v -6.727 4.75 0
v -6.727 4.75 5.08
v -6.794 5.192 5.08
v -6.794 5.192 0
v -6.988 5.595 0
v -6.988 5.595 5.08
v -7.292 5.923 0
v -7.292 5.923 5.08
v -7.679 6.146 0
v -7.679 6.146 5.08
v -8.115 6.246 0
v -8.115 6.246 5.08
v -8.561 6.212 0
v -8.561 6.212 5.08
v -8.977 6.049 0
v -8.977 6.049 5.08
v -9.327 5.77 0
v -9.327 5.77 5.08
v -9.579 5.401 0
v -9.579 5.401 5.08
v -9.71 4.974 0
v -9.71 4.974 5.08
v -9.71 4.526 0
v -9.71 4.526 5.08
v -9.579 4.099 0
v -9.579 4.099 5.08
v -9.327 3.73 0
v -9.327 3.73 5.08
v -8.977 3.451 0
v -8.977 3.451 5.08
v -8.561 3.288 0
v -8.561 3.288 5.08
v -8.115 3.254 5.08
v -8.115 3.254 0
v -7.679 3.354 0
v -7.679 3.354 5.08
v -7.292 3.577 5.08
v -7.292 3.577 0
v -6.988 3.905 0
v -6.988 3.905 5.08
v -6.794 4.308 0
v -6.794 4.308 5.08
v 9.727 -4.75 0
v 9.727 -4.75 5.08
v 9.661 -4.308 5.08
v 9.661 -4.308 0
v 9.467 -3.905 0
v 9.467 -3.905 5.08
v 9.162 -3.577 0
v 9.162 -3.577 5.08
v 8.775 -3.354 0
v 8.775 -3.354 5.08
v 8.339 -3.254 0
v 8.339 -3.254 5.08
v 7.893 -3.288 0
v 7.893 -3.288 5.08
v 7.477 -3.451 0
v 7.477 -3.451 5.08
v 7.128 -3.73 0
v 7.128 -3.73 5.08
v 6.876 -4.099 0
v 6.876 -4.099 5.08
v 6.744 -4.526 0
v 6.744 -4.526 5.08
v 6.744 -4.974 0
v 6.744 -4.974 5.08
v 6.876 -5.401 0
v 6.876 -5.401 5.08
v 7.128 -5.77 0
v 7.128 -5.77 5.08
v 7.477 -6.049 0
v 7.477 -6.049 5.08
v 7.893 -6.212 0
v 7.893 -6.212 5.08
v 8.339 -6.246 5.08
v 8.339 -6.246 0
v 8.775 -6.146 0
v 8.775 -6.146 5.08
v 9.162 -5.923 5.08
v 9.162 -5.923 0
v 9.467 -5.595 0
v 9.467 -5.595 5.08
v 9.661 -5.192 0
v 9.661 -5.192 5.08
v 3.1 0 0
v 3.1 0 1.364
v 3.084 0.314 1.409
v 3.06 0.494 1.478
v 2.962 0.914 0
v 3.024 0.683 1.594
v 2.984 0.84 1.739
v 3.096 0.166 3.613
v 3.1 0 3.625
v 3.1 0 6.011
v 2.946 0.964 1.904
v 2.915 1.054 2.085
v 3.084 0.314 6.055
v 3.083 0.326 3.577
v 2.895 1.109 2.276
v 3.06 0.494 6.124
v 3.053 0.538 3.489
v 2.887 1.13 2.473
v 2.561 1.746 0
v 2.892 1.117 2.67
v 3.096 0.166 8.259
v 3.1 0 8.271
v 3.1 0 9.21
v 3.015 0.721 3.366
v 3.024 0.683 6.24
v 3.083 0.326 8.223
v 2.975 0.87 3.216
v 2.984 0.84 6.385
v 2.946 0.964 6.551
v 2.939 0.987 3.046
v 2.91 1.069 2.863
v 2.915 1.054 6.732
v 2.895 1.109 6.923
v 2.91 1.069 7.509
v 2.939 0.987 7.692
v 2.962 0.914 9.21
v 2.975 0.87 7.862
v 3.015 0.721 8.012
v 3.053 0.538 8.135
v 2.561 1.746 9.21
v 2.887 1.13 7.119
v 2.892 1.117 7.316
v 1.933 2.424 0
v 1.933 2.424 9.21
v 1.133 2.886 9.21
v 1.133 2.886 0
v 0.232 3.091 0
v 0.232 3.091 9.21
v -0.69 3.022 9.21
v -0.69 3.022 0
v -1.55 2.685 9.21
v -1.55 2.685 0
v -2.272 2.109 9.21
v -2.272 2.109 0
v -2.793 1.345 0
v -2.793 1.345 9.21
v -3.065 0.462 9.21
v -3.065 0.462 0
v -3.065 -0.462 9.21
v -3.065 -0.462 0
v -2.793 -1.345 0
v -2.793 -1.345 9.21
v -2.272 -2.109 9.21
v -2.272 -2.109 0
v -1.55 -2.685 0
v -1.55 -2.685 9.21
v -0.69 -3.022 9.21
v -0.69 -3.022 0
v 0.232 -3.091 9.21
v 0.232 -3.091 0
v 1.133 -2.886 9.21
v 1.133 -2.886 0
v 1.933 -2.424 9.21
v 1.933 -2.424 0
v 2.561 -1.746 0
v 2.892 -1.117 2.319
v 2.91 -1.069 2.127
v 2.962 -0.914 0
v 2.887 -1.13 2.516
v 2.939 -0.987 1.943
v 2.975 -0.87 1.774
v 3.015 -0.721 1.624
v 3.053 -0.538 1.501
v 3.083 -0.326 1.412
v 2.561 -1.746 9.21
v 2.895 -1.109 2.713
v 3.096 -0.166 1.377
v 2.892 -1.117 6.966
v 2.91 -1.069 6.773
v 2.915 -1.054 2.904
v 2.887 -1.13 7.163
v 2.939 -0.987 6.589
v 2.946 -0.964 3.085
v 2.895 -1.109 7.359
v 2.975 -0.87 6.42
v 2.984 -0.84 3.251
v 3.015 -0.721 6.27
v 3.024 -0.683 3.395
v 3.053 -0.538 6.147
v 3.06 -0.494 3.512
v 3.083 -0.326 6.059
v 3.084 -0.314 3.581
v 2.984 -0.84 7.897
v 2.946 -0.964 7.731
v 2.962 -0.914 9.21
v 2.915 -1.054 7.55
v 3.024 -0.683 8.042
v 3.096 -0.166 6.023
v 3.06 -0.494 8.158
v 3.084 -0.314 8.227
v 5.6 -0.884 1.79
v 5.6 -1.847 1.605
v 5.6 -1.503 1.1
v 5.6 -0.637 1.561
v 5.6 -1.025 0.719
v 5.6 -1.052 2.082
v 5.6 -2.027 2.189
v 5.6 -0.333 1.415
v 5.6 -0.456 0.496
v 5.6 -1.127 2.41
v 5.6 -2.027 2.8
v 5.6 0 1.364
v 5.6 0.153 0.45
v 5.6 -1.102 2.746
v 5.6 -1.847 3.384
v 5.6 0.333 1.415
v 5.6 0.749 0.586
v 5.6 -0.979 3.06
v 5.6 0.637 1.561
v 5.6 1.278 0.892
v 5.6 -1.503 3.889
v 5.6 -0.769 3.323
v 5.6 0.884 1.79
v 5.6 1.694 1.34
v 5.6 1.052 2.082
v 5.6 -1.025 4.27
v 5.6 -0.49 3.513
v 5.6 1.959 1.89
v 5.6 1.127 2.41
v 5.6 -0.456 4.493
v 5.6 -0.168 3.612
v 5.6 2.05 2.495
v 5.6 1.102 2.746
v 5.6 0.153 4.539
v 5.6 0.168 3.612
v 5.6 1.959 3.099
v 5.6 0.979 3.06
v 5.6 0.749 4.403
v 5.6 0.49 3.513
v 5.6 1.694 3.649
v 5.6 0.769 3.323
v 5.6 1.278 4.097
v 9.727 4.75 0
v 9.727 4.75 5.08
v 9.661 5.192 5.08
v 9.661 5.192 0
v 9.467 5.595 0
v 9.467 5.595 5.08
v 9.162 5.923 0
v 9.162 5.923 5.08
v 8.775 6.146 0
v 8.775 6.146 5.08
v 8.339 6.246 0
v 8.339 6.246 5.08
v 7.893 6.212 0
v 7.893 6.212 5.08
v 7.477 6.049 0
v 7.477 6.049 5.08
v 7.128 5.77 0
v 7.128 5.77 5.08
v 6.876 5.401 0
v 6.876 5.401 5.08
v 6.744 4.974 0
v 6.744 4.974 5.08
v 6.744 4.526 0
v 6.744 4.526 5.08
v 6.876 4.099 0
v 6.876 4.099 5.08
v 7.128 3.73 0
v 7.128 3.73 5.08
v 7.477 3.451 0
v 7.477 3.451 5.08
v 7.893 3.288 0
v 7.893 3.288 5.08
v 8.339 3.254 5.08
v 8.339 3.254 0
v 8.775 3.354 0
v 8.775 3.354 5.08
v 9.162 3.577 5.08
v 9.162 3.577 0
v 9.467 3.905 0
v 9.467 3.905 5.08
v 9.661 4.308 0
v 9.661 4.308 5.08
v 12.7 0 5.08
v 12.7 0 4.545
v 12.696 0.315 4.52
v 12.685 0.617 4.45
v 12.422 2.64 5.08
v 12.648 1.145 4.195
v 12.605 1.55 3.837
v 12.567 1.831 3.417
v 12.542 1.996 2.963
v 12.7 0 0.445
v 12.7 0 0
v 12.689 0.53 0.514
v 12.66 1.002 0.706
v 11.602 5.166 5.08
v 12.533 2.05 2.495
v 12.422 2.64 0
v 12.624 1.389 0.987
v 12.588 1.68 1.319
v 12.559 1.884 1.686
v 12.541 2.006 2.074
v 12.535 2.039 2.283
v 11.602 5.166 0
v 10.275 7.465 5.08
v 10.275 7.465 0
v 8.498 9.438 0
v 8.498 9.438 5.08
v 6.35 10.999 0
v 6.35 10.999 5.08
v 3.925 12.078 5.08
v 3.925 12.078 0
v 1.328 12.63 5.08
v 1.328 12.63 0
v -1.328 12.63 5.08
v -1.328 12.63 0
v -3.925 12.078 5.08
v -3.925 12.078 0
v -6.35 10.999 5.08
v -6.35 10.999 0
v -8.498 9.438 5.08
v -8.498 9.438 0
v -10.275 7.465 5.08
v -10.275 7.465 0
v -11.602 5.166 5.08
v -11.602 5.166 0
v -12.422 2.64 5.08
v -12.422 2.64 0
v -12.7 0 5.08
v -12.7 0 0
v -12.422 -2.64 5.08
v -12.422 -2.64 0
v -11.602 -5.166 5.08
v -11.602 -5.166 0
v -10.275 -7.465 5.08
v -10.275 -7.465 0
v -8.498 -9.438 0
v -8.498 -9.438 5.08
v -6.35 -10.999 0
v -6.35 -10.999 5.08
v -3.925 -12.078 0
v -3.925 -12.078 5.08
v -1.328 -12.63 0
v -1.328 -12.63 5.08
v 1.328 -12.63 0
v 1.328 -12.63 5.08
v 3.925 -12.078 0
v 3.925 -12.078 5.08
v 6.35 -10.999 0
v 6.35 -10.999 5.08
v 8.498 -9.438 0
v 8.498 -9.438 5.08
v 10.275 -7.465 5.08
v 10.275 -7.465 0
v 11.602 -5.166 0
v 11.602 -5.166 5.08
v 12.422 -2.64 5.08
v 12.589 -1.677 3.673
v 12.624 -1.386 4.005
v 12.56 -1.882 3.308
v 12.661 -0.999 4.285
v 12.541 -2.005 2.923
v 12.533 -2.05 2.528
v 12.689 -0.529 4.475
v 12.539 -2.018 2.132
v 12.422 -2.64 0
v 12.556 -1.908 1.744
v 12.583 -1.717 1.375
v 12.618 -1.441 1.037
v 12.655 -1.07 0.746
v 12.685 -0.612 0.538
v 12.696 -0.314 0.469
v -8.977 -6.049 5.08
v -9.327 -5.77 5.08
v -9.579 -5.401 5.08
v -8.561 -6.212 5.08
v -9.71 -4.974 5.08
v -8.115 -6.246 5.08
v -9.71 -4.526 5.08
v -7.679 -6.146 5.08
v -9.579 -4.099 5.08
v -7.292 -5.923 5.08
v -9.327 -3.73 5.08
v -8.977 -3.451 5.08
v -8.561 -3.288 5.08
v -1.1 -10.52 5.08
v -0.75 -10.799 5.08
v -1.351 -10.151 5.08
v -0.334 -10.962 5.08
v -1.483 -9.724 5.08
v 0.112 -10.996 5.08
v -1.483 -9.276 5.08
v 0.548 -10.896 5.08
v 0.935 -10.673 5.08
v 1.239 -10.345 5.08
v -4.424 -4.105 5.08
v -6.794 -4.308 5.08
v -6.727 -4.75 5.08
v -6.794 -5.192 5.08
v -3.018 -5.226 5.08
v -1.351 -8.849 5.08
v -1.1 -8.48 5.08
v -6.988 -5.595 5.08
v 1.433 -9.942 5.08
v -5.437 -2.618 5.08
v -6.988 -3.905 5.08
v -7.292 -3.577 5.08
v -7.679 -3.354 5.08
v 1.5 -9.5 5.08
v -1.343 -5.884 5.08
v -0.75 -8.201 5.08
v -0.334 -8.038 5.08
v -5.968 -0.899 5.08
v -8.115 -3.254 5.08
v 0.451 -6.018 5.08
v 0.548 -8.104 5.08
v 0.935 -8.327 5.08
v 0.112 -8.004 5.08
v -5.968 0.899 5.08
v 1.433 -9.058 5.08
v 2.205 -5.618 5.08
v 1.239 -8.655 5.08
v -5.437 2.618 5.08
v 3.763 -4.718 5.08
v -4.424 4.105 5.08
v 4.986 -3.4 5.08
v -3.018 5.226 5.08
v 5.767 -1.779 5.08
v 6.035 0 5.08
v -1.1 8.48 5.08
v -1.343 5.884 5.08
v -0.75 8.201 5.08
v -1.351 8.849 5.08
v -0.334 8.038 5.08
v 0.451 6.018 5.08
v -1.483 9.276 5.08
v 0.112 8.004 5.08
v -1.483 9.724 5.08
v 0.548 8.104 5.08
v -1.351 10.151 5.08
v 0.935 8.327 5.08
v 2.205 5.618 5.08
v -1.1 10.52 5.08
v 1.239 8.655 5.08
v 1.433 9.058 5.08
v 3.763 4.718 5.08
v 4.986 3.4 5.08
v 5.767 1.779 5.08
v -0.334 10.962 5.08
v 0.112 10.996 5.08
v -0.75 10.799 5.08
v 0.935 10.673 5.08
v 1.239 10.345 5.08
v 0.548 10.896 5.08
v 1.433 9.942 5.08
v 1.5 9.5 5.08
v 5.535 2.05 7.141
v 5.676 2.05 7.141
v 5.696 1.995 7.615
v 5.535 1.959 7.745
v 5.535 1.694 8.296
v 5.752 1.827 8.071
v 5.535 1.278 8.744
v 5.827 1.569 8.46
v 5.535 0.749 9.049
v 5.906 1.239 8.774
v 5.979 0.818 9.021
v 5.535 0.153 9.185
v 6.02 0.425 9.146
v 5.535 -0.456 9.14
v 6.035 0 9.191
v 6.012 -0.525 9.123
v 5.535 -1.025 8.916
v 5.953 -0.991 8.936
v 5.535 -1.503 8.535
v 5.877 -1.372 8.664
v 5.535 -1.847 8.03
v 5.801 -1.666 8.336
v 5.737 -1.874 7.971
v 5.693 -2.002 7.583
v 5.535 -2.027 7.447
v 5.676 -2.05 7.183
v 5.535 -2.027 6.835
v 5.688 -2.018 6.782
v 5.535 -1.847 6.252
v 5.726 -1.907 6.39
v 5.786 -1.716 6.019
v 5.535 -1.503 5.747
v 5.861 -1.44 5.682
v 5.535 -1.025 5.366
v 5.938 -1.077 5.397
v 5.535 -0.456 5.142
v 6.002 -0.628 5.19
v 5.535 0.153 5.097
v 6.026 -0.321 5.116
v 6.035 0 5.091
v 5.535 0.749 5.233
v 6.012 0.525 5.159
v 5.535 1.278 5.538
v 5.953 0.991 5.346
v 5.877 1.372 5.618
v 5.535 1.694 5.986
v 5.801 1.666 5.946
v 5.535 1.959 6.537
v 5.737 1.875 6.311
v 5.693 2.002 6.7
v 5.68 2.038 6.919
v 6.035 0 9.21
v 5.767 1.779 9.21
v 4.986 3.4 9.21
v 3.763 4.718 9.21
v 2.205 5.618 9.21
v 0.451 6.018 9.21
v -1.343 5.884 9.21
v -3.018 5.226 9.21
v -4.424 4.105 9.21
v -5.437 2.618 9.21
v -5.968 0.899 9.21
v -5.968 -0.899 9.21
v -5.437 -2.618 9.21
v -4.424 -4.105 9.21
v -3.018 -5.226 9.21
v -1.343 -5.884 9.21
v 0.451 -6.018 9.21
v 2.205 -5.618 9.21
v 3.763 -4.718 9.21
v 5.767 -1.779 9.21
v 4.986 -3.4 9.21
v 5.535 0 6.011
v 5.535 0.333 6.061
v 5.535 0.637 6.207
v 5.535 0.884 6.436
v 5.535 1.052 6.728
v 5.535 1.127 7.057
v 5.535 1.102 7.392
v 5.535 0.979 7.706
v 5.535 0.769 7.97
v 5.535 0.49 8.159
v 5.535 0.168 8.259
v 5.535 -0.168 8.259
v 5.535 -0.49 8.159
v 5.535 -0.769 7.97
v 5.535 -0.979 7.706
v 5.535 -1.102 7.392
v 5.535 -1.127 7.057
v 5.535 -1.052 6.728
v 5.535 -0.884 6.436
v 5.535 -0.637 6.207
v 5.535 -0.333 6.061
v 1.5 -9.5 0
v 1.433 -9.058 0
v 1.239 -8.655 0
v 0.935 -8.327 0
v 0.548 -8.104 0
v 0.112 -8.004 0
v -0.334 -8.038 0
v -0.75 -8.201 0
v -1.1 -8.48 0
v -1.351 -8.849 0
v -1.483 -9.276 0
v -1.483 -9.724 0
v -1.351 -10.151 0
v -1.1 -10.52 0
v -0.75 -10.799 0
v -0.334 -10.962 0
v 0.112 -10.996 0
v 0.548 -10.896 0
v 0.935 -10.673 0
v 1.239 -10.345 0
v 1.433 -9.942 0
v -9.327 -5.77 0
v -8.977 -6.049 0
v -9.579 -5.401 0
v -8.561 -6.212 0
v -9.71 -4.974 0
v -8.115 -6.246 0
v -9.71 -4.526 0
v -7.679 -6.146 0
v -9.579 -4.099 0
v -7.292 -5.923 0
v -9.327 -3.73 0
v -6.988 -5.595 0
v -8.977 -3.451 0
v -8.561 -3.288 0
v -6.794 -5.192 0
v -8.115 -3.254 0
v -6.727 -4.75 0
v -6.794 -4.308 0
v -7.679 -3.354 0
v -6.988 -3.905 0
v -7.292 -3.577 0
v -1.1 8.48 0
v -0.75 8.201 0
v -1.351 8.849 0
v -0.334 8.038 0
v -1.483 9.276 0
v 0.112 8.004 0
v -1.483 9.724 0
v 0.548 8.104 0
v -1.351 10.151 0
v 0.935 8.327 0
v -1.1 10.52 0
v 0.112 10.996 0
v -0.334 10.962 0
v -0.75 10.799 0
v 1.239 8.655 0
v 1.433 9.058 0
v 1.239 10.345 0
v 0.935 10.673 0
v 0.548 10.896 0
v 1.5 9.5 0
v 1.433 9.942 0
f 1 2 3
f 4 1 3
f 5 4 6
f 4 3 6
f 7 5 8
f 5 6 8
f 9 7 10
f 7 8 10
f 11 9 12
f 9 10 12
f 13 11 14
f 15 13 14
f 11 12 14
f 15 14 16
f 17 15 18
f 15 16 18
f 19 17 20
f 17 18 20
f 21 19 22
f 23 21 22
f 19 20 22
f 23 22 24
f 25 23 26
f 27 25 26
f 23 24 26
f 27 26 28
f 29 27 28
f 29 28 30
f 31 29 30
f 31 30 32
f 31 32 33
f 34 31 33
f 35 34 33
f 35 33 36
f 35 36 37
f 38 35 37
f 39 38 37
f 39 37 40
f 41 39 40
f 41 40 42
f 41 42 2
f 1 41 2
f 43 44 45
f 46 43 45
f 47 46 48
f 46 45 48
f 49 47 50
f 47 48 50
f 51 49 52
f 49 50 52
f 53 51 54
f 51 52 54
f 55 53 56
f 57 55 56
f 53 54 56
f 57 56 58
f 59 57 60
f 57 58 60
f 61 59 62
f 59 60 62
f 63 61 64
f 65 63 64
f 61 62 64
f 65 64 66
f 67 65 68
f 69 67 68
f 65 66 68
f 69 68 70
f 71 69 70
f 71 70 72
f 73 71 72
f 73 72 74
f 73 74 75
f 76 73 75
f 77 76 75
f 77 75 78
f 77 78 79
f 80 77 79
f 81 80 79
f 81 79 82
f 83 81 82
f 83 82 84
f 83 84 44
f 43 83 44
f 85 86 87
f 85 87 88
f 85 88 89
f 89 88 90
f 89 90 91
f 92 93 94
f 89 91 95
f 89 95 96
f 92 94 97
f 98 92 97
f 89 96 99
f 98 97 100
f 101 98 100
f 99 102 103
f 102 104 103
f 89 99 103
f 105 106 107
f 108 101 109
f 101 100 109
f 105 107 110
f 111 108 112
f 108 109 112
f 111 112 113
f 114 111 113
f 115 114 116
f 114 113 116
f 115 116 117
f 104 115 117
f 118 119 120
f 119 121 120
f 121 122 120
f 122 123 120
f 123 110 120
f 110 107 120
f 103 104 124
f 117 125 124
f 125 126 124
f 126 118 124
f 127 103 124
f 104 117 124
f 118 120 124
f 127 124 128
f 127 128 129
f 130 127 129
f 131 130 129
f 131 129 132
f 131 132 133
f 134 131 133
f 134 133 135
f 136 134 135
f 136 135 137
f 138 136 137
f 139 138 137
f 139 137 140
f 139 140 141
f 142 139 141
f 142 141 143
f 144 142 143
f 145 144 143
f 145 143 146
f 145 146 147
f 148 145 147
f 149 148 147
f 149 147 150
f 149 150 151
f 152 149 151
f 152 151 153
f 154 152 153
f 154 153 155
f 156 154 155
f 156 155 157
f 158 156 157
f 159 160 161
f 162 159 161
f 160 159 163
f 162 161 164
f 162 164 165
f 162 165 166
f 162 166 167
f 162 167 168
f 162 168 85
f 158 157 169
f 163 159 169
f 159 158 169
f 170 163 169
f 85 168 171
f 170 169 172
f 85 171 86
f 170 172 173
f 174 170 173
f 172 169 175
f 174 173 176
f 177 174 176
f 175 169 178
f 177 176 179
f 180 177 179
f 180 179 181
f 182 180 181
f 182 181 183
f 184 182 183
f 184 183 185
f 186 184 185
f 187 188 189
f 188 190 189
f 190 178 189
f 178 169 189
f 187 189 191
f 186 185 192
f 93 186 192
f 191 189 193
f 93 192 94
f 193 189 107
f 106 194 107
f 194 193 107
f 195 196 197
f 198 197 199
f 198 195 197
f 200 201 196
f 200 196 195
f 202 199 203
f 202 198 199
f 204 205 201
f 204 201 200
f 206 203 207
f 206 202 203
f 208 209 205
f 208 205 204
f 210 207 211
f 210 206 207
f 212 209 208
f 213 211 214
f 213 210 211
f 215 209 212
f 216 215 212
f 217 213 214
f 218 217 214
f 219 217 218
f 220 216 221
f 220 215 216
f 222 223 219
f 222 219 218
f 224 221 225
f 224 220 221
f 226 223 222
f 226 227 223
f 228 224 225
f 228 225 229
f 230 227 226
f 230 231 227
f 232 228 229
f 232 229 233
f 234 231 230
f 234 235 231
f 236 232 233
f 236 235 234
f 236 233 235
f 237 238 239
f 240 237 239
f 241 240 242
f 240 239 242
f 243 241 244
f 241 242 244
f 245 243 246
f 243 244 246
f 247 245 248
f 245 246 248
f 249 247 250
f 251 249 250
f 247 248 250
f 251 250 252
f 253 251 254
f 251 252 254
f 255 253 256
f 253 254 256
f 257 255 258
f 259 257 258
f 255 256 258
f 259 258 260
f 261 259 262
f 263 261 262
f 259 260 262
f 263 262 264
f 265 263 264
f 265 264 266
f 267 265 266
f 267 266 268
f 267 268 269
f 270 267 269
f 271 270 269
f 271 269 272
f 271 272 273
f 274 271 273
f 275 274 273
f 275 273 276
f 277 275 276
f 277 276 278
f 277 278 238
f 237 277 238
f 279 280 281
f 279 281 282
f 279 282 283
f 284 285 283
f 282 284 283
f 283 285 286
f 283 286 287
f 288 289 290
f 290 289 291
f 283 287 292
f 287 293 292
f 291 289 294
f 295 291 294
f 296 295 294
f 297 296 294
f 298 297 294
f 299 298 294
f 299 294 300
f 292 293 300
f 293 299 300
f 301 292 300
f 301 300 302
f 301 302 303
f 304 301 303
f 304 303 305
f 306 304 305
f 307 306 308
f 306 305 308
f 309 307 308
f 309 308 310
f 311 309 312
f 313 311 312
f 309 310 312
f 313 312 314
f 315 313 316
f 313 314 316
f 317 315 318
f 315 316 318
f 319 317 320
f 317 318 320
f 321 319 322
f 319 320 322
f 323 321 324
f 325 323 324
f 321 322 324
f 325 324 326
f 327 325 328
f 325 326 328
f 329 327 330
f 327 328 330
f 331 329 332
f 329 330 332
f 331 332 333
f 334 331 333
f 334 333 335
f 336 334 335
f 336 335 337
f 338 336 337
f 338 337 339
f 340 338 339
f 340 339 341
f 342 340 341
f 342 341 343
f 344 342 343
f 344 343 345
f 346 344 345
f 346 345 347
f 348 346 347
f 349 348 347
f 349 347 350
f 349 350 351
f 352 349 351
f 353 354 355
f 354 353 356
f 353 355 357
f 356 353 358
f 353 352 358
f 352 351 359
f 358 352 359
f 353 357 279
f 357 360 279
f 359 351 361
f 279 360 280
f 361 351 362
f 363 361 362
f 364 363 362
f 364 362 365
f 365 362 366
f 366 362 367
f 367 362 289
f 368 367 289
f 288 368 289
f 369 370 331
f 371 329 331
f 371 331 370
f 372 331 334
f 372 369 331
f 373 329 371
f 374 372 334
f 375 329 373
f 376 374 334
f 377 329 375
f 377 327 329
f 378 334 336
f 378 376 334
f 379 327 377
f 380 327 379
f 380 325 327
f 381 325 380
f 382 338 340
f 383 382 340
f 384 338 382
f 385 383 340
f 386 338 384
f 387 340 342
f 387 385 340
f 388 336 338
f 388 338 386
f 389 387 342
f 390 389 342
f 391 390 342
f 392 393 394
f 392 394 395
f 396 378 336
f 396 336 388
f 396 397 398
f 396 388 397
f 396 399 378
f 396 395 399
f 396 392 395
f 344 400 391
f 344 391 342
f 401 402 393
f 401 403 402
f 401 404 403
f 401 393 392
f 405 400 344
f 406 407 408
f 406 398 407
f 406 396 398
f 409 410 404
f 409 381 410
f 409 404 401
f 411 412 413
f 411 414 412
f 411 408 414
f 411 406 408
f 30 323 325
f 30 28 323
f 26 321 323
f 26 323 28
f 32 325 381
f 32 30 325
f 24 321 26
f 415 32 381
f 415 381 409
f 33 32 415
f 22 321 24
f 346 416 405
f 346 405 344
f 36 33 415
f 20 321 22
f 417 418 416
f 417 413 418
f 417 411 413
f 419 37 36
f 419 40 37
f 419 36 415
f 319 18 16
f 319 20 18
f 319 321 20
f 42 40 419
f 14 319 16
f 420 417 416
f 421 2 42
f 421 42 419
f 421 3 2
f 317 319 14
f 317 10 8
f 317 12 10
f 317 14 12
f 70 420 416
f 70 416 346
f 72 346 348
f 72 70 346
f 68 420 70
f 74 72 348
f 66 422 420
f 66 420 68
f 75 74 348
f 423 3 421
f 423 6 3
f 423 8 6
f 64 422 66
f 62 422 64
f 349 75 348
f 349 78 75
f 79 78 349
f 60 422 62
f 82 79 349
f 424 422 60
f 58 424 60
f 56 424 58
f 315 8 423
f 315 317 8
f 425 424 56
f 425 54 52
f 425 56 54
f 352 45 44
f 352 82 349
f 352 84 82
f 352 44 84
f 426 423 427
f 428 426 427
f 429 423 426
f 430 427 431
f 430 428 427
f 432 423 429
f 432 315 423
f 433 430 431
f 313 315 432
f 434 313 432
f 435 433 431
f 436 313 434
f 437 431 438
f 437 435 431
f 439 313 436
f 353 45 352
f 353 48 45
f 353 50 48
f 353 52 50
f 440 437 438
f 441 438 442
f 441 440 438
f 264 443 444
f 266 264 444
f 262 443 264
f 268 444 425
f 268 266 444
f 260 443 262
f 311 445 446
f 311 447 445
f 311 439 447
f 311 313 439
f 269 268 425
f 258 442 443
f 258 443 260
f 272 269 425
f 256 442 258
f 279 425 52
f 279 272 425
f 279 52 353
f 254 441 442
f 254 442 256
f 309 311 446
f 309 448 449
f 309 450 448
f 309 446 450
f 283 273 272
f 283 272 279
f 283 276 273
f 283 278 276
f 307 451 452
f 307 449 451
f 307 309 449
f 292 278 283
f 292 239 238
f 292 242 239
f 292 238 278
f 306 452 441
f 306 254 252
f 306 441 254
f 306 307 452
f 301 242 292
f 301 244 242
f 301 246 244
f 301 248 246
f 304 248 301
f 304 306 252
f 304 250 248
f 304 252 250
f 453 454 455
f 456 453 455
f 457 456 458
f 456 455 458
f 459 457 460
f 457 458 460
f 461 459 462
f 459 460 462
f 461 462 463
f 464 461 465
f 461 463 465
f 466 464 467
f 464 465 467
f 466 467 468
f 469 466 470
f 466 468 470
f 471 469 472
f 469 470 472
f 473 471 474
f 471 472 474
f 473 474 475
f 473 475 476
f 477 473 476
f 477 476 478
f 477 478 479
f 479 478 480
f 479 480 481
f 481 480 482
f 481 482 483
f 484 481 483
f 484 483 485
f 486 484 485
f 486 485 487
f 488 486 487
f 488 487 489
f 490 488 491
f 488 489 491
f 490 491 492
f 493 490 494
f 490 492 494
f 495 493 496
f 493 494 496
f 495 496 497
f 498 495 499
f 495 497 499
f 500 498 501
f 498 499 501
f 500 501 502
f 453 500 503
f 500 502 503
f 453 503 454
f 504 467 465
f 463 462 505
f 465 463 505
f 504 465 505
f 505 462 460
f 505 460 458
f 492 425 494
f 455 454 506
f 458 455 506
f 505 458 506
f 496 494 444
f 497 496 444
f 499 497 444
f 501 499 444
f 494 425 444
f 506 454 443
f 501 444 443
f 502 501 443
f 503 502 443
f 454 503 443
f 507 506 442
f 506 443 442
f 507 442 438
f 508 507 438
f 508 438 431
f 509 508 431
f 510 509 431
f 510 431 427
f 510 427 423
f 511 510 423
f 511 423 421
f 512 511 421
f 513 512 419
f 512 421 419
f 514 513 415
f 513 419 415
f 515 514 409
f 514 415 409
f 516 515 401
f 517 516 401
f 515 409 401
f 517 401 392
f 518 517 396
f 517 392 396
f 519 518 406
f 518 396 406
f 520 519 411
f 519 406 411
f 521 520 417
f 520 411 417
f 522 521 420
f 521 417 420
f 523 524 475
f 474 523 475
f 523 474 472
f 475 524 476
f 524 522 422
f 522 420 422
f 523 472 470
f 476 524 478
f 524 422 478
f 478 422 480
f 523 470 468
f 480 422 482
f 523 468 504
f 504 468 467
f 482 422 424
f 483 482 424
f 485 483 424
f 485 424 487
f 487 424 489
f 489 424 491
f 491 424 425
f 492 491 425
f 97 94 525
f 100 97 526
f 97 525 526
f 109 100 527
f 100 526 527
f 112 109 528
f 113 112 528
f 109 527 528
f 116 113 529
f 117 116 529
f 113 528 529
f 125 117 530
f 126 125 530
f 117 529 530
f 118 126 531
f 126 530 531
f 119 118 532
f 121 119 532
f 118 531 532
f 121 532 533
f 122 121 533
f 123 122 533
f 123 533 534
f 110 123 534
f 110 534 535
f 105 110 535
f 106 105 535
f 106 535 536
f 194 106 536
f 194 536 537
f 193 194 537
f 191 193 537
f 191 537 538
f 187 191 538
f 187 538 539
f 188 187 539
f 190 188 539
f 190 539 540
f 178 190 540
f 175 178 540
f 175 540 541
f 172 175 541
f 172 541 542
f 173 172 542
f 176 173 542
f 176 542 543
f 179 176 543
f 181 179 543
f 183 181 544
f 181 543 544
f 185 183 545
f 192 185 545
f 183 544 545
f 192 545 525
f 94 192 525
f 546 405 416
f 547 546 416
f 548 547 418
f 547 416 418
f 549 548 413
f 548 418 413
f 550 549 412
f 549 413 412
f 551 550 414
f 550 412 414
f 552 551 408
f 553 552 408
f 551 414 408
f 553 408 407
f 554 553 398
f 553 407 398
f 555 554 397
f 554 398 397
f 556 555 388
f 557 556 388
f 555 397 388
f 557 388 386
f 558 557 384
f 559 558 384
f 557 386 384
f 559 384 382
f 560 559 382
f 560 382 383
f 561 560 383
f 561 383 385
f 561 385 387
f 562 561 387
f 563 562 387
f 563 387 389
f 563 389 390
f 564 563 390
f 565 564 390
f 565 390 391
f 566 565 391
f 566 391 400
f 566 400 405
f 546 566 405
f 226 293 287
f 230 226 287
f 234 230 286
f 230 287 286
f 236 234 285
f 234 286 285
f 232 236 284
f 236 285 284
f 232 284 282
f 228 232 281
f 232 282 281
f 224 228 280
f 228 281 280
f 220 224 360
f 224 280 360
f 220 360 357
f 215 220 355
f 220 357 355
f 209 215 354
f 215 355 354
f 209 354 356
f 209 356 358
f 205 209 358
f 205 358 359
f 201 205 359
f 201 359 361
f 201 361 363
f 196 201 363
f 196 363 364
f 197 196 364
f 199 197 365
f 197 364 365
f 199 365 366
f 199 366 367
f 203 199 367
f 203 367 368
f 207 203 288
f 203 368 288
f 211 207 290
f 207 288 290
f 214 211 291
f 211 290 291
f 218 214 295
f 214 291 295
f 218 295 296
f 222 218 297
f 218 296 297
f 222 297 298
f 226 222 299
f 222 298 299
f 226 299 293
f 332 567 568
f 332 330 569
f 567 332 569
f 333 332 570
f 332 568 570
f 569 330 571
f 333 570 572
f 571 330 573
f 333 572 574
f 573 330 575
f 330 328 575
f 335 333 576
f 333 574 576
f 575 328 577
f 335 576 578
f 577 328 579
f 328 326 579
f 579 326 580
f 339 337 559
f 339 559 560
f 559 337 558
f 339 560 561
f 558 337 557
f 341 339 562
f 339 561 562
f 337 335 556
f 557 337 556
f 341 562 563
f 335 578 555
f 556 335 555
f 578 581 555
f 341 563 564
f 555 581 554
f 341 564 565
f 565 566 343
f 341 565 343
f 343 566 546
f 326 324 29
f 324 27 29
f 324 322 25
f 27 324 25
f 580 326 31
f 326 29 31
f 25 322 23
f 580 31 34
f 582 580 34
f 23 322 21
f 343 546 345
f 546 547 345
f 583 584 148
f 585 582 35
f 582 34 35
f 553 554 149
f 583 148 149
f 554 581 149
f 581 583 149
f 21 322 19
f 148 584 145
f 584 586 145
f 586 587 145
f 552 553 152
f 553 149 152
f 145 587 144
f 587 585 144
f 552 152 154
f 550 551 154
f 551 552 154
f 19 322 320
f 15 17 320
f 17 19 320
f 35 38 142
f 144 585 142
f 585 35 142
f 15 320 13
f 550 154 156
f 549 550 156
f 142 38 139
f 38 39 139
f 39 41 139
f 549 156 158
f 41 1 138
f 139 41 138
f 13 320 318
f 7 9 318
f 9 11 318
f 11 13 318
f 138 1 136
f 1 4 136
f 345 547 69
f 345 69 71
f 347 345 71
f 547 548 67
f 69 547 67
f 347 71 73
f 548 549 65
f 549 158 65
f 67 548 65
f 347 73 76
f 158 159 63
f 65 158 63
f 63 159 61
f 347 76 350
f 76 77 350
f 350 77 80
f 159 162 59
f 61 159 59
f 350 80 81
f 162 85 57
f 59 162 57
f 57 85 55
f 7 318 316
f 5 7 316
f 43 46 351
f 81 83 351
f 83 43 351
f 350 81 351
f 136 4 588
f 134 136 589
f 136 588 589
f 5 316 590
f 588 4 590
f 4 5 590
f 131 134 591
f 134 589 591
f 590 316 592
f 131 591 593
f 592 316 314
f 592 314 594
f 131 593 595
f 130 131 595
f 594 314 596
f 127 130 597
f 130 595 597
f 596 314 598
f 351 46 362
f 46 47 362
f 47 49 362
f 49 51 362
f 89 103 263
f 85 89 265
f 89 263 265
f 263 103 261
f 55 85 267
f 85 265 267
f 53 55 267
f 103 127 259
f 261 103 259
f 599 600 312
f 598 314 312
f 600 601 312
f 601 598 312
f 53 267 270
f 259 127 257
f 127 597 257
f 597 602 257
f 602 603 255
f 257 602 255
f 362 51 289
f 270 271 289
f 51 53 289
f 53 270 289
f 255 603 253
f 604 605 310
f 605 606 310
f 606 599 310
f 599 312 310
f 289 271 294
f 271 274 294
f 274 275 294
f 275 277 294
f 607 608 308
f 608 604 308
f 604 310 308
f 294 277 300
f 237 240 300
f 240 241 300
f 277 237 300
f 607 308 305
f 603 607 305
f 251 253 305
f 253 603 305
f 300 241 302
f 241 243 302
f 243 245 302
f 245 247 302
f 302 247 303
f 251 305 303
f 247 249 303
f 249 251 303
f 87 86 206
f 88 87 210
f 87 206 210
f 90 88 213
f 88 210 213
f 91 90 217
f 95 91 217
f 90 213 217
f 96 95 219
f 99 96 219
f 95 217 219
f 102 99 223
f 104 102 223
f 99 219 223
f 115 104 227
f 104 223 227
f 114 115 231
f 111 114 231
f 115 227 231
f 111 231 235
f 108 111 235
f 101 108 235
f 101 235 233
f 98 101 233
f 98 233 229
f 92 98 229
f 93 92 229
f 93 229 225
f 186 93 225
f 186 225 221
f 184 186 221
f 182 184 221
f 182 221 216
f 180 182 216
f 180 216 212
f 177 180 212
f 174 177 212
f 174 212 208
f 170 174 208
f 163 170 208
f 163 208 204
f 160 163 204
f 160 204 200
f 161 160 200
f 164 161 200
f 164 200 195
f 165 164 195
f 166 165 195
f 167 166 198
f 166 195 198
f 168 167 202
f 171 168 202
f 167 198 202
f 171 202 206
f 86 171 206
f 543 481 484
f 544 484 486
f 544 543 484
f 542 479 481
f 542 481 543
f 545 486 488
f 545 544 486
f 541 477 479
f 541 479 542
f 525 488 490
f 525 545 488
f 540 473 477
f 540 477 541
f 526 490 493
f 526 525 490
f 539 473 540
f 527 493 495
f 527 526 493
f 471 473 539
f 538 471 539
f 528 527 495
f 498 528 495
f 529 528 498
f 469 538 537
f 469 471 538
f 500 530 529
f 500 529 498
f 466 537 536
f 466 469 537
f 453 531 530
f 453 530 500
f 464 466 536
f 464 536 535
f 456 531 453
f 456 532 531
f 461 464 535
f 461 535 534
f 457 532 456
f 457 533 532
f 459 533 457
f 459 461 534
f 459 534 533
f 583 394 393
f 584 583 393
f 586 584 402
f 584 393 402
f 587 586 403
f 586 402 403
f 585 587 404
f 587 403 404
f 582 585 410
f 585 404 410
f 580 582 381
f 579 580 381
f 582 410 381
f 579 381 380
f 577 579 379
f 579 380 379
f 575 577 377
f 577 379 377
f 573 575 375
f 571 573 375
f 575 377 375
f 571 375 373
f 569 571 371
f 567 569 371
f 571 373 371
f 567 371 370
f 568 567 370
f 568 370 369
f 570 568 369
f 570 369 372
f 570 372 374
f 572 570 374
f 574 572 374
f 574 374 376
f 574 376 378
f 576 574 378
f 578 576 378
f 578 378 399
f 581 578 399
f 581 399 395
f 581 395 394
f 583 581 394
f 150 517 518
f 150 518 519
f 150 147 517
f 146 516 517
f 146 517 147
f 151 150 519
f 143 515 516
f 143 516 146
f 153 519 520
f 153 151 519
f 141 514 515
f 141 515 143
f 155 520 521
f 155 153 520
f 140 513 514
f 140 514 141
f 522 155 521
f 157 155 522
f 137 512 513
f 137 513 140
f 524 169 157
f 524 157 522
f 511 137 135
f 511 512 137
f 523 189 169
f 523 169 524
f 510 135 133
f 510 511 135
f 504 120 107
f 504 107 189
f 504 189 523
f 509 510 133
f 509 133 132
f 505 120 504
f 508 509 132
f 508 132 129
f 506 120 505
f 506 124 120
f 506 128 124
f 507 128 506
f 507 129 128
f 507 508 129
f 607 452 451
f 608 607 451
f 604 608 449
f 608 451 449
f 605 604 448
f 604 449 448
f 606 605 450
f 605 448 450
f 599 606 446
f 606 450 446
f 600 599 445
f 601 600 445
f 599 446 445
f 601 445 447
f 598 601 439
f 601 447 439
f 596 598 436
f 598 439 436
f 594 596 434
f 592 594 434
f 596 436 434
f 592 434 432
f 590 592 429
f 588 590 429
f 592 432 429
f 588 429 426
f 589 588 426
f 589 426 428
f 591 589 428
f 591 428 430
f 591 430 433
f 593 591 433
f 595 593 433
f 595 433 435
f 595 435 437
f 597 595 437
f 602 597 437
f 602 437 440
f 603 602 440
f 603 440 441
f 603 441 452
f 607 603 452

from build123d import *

# Parameters (mm, degrees)
SKETCH1_R                  = 12.7
BOSS_EXTRUDE1_DEPTH        = 5.08
SKETCH2_R                  = 6.035
BOSS_EXTRUDE2_DEPTH        = 4.13
CUT_EXTRUDE1_REACH         = 22.184
SKETCH3_R                  = 3.1
SKETCH16_R                 = 2.05
CUT_EXTRUDE2_DEPTH         = 0.5
F_4_40_TAPPED_HOLE3_REACH  = 26.055
F_4_40_TAPPED_HOLE3_BORE_R = 1.1303
SKETCH24_R                 = 2.05
CUT_EXTRUDE3_DEPTH         = 7.1
F_4_40_TAPPED_HOLE4_REACH  = 26.104
F_4_40_TAPPED_HOLE4_BORE_R = 1.1303
SKETCH29_R                 = 1.5
CUT_EXTRUDE4_DEPTH         = 10


with BuildPart() as part:
    # Sketch1 → Boss-Extrude1 (new body)
    with BuildSketch(Plane.XY):
        Circle(SKETCH1_R)
    extrude(amount=BOSS_EXTRUDE1_DEPTH)

    # Sketch2 → Boss-Extrude2 (add)
    with BuildSketch(Plane.XY.offset(5.08)):
        Circle(SKETCH2_R)
    extrude(amount=BOSS_EXTRUDE2_DEPTH)

    # Sketch3 → Cut-Extrude1 (cut, up to next)
    with BuildSketch(Plane.XY.offset(9.21), mode=Mode.PRIVATE) as cut_extrude1_sk1:
        Circle(SKETCH3_R)
    cut_extrude1_tool1 = extrude(cut_extrude1_sk1.sketch, amount=-CUT_EXTRUDE1_REACH, mode=Mode.PRIVATE) & part.part
    add(cut_extrude1_tool1.solids().sort_by_distance((0, 0, 9.21))[0], mode=Mode.SUBTRACT)

    # Sketch16 → Cut-Extrude2 (cut)
    with BuildSketch(Plane(origin=(6.035, 0, 9.21), x_dir=(0, 0, -1), z_dir=(1, 0, 0))):
        with Locations(Location((2.069027283, 0, 0), (0, 0, 90))):
            Circle(SKETCH16_R)
    extrude(amount=-CUT_EXTRUDE2_DEPTH, mode=Mode.SUBTRACT)

    # #4-40 Tapped Hole3 bore → #4-40 Tapped Hole3 (cut, up to next)
    with BuildSketch(Plane(origin=(5.535, 0, 0), x_dir=(0, 0, -1), z_dir=(1, 0, 0)), mode=Mode.PRIVATE) as f_4_40_tapped_hole3_sk1:
        with Locations((-7.140972717, 0)):
            Circle(F_4_40_TAPPED_HOLE3_BORE_R)
    f_4_40_tapped_hole3_tool1 = extrude(f_4_40_tapped_hole3_sk1.sketch, amount=-F_4_40_TAPPED_HOLE3_REACH, mode=Mode.PRIVATE) & part.part
    add(f_4_40_tapped_hole3_tool1.solids().sort_by_distance((5.535, 0, 7.140973))[0], mode=Mode.SUBTRACT)

    # Sketch24 → Cut-Extrude3 (cut)
    with BuildSketch(Plane(origin=(12.7, 0, 5.08), x_dir=(0, 0, -1), z_dir=(1, 0, 0))):
        with Locations(Location((2.585319139, 0, 0), (0, 0, 90))):
            Circle(SKETCH24_R)
    extrude(amount=-CUT_EXTRUDE3_DEPTH, mode=Mode.SUBTRACT)

    # #4-40 Tapped Hole4 bore → #4-40 Tapped Hole4 (cut, up to next)
    with BuildSketch(Plane(origin=(5.6, 0, 0), x_dir=(0, 0, -1), z_dir=(1, 0, 0)), mode=Mode.PRIVATE) as f_4_40_tapped_hole4_sk1:
        with Locations((-2.494680861, 0)):
            Circle(F_4_40_TAPPED_HOLE4_BORE_R)
    f_4_40_tapped_hole4_tool1 = extrude(f_4_40_tapped_hole4_sk1.sketch, amount=-F_4_40_TAPPED_HOLE4_REACH, mode=Mode.PRIVATE) & part.part
    add(f_4_40_tapped_hole4_tool1.solids().sort_by_distance((5.6, 0, 2.494681))[0], mode=Mode.SUBTRACT)

    # Sketch29 → Cut-Extrude4 (cut)
    with BuildSketch(Plane.XY.offset(5.08)):
        with Locations((0, 9.5)):
            Circle(SKETCH29_R)
        with Locations((8.227241336, 4.75)):
            Circle(SKETCH29_R)
        with Locations((8.227241336, -4.75)):
            Circle(SKETCH29_R)
        with Locations((0, -9.5)):
            Circle(SKETCH29_R)
        with Locations((-8.227241336, -4.75)):
            Circle(SKETCH29_R)
        with Locations((-8.227241336, 4.75)):
            Circle(SKETCH29_R)
    extrude(amount=-CUT_EXTRUDE4_DEPTH, mode=Mode.SUBTRACT)


solid = part.part
